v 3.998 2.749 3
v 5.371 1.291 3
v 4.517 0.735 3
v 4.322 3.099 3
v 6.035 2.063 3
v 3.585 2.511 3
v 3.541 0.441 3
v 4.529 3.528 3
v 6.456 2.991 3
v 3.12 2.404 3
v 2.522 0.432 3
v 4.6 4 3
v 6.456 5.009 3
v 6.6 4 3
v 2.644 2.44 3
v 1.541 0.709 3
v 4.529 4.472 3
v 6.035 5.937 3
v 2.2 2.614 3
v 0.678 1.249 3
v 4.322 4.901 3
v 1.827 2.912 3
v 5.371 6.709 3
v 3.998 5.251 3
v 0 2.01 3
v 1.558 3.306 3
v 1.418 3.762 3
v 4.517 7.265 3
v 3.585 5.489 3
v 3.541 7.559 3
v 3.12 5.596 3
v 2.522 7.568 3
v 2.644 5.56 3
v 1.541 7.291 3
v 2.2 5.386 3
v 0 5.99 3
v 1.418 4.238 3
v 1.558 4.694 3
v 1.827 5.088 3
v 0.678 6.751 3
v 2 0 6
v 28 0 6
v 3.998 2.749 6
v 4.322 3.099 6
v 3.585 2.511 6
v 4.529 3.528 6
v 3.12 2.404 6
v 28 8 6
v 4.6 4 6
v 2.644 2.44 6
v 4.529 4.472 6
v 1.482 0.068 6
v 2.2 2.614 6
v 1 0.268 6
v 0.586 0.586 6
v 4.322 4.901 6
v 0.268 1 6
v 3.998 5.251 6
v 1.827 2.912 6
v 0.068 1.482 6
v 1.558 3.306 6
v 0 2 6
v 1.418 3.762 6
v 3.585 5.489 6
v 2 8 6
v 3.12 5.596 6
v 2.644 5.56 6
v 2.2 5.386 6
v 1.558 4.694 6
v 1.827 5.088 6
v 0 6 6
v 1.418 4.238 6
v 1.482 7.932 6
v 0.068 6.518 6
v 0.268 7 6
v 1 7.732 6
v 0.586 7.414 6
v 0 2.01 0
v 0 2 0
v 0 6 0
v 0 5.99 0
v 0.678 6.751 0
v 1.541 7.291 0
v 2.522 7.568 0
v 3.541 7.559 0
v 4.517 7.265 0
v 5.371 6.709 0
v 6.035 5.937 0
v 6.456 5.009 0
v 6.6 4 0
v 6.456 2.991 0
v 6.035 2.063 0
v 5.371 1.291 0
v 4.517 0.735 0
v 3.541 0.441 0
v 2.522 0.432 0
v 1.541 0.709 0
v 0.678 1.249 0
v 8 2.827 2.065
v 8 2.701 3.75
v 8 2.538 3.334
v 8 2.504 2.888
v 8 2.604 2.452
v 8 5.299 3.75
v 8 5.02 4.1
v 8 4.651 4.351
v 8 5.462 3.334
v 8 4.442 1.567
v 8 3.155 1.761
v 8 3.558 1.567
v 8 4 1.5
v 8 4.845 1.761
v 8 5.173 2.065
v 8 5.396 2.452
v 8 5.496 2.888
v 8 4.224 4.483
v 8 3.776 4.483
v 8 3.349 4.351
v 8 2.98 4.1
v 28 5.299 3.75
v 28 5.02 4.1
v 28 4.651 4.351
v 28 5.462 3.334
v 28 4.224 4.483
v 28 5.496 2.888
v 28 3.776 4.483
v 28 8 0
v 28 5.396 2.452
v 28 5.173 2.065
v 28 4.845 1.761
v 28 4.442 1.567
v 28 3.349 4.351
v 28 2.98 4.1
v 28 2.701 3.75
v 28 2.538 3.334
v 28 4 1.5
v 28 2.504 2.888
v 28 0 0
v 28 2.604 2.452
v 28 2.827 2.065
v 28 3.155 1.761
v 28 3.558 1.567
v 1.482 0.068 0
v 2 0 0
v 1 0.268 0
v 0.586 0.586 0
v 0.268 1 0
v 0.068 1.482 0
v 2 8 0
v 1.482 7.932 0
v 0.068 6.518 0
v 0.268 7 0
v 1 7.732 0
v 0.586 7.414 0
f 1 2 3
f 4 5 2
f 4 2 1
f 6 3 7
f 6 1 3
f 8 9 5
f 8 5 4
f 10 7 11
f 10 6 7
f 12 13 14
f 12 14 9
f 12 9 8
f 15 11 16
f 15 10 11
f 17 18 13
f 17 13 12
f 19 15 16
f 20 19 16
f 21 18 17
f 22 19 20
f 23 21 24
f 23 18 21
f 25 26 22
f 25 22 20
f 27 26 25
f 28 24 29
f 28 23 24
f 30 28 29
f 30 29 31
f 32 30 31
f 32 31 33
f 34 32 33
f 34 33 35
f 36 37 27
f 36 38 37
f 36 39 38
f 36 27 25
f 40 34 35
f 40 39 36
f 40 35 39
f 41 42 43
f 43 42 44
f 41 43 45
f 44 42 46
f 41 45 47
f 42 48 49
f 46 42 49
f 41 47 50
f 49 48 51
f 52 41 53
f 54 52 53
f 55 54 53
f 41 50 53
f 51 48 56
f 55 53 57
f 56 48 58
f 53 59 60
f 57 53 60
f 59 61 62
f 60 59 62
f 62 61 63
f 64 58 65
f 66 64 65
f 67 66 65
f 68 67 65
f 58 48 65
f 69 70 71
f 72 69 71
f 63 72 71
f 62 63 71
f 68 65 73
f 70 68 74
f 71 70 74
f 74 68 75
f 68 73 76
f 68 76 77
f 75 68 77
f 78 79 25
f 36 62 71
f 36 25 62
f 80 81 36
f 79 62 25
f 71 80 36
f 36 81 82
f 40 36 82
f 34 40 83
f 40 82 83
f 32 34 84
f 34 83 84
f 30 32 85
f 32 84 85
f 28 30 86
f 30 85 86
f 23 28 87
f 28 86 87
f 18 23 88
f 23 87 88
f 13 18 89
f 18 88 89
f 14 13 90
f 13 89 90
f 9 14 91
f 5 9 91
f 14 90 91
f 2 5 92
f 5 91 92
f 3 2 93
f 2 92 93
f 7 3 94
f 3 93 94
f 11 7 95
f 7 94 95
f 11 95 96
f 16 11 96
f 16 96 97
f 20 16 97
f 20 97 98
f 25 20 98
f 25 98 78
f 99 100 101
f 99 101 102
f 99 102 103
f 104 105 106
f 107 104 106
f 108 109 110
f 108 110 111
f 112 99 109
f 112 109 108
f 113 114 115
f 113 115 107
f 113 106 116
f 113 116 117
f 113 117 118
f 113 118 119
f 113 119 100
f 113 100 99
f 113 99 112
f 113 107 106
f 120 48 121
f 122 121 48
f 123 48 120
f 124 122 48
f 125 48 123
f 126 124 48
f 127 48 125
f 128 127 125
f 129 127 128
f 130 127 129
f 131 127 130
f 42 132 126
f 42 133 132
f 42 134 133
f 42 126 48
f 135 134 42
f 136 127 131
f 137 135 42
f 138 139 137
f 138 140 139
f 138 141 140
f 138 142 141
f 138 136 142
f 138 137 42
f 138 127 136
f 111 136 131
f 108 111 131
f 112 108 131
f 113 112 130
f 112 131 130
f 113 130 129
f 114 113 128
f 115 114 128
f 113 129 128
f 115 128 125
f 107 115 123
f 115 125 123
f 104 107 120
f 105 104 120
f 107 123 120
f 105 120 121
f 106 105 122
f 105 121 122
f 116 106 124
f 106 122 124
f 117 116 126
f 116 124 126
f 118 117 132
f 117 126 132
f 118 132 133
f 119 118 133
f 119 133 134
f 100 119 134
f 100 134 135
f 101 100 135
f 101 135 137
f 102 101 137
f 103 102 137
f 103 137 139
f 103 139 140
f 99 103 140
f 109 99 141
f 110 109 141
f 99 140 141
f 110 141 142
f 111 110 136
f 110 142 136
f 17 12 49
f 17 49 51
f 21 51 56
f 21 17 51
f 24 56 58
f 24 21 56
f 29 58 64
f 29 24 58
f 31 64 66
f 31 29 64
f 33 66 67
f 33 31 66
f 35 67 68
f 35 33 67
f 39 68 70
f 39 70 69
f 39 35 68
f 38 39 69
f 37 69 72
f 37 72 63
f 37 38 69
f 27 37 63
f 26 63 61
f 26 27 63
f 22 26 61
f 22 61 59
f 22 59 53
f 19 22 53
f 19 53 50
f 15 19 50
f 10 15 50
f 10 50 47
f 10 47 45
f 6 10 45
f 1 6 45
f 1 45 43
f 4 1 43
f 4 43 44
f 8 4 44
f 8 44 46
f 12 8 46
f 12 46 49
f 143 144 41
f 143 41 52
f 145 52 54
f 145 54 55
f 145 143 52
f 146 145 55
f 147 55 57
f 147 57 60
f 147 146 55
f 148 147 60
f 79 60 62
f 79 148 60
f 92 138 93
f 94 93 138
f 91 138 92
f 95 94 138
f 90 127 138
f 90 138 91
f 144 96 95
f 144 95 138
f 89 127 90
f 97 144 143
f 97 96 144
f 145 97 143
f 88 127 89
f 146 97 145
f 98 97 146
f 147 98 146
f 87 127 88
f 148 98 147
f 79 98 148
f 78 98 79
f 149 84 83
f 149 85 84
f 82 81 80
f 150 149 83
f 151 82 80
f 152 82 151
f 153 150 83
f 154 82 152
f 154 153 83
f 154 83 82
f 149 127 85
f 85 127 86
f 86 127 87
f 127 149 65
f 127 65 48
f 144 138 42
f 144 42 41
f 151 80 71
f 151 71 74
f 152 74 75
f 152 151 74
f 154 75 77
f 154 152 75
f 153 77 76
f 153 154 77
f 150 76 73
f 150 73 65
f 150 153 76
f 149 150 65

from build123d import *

# Parameters (mm, degrees)
SKETCH_2_R          = 1.6
EXTRUDE_1_DEPTH     = 6
SKETCH_3_R          = 1.5
CUT_EXTRUDE_1_DEPTH = 20
SKETCH_4_R          = 3.6
CUT_EXTRUDE_2_DEPTH = 3


with BuildPart() as part:
    # 草图2 → 凸台-拉伸1 (new body)
    with BuildSketch(Plane.XY):
        with BuildLine():
            Line((0, 2), (0, 6))
            ThreePointArc((0, 6), (0.585786438, 7.414213562), (2, 8))
            Line((2, 8), (28, 8))
            Line((28, 8), (28, 0))
            Line((28, 0), (2, 0))
            ThreePointArc((2, 0), (0.585786438, 0.585786438), (0, 2))
        make_face()
        with Locations((3, 4)):
            Circle(SKETCH_2_R, mode=Mode.SUBTRACT)
    extrude(amount=EXTRUDE_1_DEPTH)

    # 草图3 → 切除-拉伸1 (cut)
    with BuildSketch(Plane(origin=(28, 0, 0), x_dir=(0, 0, -1), z_dir=(1, 0, 0))):
        with Locations((-3, 4)):
            Circle(SKETCH_3_R)
    extrude(amount=-CUT_EXTRUDE_1_DEPTH, mode=Mode.SUBTRACT)

    # 草图4 → 切除-拉伸2 (cut)
    with BuildSketch(Plane(origin=(0, 0, 0), x_dir=(-1, 0, 0), z_dir=(0, 0, -1))):
        with Locations((-3, 4)):
            Circle(SKETCH_4_R)
    extrude(amount=-CUT_EXTRUDE_2_DEPTH, mode=Mode.SUBTRACT)


solid = part.part
